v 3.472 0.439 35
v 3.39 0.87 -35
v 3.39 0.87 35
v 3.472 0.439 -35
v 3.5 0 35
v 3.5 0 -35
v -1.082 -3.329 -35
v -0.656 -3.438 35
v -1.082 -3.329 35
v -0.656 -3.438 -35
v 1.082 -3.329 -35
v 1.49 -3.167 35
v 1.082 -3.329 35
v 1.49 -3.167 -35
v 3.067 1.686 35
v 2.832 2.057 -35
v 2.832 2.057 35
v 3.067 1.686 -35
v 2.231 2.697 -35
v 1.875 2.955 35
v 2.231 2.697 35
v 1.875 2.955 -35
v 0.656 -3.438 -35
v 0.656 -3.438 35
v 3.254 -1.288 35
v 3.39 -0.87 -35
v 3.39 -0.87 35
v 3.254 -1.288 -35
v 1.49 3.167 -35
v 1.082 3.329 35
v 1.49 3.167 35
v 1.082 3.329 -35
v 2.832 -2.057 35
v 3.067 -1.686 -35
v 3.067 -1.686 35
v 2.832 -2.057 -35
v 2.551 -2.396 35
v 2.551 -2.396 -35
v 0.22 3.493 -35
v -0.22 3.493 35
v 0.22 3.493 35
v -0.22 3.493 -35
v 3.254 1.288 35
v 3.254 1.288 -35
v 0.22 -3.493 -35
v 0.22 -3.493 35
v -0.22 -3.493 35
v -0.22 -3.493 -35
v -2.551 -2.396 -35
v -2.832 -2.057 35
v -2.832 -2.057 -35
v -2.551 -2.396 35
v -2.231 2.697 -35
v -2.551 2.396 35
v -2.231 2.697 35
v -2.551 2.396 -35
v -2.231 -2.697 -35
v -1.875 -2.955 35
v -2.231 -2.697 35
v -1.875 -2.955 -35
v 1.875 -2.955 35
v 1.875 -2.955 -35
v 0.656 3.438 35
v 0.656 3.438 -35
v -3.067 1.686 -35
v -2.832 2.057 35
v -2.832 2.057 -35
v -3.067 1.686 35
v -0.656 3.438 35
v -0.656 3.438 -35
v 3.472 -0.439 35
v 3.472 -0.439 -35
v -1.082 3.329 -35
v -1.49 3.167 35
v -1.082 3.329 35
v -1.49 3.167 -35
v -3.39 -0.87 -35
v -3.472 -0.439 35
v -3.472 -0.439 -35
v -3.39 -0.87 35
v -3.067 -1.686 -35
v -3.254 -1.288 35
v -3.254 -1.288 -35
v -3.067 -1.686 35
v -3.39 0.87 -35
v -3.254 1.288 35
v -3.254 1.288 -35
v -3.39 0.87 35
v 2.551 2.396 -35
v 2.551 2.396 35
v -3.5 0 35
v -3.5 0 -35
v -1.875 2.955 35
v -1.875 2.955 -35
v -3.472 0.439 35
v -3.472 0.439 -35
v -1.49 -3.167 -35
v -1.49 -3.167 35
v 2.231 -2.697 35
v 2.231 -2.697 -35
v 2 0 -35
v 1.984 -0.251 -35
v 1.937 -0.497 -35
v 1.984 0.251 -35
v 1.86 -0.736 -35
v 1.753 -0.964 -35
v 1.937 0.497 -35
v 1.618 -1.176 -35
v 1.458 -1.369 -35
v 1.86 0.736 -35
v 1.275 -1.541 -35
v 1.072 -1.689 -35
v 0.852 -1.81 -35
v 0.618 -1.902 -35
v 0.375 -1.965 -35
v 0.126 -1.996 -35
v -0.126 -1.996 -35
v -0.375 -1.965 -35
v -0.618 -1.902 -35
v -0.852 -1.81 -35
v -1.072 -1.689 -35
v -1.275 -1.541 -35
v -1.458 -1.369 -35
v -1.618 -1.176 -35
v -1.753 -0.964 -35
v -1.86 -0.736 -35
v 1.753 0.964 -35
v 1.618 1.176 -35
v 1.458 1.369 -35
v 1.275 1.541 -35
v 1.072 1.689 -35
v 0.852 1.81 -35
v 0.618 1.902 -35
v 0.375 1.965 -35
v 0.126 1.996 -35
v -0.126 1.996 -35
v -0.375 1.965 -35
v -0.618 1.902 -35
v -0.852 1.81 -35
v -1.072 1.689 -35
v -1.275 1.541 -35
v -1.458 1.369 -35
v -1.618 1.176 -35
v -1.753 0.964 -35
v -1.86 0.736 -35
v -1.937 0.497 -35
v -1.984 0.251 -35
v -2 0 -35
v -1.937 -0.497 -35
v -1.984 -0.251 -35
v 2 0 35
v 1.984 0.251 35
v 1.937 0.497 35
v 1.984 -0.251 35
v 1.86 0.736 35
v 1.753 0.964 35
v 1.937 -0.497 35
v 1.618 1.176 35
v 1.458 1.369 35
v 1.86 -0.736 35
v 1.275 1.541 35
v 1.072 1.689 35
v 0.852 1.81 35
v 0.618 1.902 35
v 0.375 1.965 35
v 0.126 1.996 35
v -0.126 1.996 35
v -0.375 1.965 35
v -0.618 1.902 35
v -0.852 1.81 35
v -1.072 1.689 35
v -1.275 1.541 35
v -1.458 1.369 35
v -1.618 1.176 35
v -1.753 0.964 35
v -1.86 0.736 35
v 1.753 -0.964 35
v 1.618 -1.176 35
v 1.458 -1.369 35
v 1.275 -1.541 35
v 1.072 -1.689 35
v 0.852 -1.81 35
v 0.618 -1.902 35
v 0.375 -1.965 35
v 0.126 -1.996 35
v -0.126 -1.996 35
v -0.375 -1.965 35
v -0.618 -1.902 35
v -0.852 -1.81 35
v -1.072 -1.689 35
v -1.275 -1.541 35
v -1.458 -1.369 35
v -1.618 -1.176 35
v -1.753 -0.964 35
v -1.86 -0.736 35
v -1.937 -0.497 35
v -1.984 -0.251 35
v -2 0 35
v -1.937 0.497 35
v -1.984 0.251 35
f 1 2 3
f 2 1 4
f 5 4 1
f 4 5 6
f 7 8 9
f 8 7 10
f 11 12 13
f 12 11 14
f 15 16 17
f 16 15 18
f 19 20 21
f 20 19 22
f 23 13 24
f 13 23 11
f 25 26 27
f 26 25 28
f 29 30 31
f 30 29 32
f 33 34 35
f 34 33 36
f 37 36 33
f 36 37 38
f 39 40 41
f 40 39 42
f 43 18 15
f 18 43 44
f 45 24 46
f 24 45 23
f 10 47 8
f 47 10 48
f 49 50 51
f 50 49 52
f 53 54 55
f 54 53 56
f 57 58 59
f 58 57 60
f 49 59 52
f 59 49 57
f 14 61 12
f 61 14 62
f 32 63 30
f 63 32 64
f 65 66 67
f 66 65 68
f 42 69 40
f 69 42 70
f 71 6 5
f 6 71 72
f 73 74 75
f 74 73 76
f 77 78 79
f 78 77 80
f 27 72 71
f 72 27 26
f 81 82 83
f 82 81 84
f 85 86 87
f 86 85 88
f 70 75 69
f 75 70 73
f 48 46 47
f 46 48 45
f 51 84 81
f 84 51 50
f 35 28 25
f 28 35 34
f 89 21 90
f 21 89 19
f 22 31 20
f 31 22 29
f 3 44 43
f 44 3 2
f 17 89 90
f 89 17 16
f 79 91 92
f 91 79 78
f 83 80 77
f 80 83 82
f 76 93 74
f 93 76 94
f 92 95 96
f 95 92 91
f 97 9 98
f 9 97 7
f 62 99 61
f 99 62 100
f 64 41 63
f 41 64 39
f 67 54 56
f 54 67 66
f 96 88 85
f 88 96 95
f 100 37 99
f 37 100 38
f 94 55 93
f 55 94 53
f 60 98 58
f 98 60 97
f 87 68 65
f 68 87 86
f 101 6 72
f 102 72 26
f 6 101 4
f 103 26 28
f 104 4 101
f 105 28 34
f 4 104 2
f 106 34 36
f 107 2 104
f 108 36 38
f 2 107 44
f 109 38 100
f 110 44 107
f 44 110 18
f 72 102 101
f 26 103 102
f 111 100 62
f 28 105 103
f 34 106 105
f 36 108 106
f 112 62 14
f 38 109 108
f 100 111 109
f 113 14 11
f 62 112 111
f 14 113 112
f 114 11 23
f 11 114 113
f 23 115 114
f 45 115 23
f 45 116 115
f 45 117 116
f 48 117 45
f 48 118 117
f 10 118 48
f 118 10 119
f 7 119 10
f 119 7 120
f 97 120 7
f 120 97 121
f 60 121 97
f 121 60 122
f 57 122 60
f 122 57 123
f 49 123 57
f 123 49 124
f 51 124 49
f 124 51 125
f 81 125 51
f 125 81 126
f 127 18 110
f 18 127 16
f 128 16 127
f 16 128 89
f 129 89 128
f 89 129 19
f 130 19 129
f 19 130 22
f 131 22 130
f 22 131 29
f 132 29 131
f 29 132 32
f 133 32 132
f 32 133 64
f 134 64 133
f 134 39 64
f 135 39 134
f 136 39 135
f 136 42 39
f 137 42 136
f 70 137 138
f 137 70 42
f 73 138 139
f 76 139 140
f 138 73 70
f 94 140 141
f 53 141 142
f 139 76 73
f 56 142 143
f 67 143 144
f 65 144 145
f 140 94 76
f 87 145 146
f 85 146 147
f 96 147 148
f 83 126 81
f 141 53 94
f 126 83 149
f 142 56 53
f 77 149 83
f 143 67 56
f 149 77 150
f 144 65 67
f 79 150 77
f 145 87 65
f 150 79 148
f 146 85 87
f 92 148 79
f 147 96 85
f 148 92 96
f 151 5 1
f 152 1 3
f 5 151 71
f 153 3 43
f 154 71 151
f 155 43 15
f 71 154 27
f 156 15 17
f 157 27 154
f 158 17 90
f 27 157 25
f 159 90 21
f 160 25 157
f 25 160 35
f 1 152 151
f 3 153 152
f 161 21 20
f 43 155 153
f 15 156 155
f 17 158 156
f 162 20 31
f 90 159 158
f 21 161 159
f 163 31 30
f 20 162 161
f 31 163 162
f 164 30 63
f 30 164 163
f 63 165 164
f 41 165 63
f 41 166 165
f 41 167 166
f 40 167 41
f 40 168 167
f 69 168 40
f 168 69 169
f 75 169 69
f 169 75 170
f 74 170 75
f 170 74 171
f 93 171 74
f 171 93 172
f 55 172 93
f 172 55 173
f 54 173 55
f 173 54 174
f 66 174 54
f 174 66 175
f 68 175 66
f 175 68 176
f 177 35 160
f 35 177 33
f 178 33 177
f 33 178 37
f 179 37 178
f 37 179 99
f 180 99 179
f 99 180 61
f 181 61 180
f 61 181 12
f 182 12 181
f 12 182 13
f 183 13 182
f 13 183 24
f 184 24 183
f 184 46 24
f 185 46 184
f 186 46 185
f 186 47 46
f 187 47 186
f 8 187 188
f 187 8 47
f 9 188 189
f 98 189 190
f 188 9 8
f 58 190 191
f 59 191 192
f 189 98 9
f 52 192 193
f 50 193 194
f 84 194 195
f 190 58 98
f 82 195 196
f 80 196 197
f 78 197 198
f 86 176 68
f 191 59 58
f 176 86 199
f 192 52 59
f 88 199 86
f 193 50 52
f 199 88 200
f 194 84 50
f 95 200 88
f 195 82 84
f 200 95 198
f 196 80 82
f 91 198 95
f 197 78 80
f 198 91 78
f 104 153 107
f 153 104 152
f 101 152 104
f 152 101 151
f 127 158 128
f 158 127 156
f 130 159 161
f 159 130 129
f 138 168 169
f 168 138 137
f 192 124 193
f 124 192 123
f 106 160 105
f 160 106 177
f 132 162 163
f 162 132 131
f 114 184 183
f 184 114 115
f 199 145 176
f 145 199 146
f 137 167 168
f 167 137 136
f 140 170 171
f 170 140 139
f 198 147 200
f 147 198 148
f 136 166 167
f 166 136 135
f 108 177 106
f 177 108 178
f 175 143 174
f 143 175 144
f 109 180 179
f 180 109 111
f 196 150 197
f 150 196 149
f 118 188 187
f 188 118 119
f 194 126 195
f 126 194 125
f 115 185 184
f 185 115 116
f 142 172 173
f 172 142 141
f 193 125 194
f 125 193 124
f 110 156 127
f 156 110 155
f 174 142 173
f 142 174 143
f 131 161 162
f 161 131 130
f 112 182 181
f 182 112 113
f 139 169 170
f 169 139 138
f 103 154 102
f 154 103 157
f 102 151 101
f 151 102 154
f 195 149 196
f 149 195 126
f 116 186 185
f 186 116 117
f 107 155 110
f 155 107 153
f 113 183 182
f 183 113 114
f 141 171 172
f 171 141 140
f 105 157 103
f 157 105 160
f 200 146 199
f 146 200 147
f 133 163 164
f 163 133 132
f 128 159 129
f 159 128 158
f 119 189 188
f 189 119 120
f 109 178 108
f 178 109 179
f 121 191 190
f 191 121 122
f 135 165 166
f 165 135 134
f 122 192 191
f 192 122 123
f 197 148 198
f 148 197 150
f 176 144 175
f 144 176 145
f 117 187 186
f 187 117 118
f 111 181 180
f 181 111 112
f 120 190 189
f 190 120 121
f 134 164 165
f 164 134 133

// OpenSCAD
$fn = 50;


difference() {
	union() {
		translate(v = [0, 0, -35.0000000000]) {
			cylinder(h = 70, r = 3.5000000000);
		}
	}
	union() {
		translate(v = [0, 0, -100.0000000000]) {
			cylinder(h = 200, r = 2.0000000000);
		}
	}
}
